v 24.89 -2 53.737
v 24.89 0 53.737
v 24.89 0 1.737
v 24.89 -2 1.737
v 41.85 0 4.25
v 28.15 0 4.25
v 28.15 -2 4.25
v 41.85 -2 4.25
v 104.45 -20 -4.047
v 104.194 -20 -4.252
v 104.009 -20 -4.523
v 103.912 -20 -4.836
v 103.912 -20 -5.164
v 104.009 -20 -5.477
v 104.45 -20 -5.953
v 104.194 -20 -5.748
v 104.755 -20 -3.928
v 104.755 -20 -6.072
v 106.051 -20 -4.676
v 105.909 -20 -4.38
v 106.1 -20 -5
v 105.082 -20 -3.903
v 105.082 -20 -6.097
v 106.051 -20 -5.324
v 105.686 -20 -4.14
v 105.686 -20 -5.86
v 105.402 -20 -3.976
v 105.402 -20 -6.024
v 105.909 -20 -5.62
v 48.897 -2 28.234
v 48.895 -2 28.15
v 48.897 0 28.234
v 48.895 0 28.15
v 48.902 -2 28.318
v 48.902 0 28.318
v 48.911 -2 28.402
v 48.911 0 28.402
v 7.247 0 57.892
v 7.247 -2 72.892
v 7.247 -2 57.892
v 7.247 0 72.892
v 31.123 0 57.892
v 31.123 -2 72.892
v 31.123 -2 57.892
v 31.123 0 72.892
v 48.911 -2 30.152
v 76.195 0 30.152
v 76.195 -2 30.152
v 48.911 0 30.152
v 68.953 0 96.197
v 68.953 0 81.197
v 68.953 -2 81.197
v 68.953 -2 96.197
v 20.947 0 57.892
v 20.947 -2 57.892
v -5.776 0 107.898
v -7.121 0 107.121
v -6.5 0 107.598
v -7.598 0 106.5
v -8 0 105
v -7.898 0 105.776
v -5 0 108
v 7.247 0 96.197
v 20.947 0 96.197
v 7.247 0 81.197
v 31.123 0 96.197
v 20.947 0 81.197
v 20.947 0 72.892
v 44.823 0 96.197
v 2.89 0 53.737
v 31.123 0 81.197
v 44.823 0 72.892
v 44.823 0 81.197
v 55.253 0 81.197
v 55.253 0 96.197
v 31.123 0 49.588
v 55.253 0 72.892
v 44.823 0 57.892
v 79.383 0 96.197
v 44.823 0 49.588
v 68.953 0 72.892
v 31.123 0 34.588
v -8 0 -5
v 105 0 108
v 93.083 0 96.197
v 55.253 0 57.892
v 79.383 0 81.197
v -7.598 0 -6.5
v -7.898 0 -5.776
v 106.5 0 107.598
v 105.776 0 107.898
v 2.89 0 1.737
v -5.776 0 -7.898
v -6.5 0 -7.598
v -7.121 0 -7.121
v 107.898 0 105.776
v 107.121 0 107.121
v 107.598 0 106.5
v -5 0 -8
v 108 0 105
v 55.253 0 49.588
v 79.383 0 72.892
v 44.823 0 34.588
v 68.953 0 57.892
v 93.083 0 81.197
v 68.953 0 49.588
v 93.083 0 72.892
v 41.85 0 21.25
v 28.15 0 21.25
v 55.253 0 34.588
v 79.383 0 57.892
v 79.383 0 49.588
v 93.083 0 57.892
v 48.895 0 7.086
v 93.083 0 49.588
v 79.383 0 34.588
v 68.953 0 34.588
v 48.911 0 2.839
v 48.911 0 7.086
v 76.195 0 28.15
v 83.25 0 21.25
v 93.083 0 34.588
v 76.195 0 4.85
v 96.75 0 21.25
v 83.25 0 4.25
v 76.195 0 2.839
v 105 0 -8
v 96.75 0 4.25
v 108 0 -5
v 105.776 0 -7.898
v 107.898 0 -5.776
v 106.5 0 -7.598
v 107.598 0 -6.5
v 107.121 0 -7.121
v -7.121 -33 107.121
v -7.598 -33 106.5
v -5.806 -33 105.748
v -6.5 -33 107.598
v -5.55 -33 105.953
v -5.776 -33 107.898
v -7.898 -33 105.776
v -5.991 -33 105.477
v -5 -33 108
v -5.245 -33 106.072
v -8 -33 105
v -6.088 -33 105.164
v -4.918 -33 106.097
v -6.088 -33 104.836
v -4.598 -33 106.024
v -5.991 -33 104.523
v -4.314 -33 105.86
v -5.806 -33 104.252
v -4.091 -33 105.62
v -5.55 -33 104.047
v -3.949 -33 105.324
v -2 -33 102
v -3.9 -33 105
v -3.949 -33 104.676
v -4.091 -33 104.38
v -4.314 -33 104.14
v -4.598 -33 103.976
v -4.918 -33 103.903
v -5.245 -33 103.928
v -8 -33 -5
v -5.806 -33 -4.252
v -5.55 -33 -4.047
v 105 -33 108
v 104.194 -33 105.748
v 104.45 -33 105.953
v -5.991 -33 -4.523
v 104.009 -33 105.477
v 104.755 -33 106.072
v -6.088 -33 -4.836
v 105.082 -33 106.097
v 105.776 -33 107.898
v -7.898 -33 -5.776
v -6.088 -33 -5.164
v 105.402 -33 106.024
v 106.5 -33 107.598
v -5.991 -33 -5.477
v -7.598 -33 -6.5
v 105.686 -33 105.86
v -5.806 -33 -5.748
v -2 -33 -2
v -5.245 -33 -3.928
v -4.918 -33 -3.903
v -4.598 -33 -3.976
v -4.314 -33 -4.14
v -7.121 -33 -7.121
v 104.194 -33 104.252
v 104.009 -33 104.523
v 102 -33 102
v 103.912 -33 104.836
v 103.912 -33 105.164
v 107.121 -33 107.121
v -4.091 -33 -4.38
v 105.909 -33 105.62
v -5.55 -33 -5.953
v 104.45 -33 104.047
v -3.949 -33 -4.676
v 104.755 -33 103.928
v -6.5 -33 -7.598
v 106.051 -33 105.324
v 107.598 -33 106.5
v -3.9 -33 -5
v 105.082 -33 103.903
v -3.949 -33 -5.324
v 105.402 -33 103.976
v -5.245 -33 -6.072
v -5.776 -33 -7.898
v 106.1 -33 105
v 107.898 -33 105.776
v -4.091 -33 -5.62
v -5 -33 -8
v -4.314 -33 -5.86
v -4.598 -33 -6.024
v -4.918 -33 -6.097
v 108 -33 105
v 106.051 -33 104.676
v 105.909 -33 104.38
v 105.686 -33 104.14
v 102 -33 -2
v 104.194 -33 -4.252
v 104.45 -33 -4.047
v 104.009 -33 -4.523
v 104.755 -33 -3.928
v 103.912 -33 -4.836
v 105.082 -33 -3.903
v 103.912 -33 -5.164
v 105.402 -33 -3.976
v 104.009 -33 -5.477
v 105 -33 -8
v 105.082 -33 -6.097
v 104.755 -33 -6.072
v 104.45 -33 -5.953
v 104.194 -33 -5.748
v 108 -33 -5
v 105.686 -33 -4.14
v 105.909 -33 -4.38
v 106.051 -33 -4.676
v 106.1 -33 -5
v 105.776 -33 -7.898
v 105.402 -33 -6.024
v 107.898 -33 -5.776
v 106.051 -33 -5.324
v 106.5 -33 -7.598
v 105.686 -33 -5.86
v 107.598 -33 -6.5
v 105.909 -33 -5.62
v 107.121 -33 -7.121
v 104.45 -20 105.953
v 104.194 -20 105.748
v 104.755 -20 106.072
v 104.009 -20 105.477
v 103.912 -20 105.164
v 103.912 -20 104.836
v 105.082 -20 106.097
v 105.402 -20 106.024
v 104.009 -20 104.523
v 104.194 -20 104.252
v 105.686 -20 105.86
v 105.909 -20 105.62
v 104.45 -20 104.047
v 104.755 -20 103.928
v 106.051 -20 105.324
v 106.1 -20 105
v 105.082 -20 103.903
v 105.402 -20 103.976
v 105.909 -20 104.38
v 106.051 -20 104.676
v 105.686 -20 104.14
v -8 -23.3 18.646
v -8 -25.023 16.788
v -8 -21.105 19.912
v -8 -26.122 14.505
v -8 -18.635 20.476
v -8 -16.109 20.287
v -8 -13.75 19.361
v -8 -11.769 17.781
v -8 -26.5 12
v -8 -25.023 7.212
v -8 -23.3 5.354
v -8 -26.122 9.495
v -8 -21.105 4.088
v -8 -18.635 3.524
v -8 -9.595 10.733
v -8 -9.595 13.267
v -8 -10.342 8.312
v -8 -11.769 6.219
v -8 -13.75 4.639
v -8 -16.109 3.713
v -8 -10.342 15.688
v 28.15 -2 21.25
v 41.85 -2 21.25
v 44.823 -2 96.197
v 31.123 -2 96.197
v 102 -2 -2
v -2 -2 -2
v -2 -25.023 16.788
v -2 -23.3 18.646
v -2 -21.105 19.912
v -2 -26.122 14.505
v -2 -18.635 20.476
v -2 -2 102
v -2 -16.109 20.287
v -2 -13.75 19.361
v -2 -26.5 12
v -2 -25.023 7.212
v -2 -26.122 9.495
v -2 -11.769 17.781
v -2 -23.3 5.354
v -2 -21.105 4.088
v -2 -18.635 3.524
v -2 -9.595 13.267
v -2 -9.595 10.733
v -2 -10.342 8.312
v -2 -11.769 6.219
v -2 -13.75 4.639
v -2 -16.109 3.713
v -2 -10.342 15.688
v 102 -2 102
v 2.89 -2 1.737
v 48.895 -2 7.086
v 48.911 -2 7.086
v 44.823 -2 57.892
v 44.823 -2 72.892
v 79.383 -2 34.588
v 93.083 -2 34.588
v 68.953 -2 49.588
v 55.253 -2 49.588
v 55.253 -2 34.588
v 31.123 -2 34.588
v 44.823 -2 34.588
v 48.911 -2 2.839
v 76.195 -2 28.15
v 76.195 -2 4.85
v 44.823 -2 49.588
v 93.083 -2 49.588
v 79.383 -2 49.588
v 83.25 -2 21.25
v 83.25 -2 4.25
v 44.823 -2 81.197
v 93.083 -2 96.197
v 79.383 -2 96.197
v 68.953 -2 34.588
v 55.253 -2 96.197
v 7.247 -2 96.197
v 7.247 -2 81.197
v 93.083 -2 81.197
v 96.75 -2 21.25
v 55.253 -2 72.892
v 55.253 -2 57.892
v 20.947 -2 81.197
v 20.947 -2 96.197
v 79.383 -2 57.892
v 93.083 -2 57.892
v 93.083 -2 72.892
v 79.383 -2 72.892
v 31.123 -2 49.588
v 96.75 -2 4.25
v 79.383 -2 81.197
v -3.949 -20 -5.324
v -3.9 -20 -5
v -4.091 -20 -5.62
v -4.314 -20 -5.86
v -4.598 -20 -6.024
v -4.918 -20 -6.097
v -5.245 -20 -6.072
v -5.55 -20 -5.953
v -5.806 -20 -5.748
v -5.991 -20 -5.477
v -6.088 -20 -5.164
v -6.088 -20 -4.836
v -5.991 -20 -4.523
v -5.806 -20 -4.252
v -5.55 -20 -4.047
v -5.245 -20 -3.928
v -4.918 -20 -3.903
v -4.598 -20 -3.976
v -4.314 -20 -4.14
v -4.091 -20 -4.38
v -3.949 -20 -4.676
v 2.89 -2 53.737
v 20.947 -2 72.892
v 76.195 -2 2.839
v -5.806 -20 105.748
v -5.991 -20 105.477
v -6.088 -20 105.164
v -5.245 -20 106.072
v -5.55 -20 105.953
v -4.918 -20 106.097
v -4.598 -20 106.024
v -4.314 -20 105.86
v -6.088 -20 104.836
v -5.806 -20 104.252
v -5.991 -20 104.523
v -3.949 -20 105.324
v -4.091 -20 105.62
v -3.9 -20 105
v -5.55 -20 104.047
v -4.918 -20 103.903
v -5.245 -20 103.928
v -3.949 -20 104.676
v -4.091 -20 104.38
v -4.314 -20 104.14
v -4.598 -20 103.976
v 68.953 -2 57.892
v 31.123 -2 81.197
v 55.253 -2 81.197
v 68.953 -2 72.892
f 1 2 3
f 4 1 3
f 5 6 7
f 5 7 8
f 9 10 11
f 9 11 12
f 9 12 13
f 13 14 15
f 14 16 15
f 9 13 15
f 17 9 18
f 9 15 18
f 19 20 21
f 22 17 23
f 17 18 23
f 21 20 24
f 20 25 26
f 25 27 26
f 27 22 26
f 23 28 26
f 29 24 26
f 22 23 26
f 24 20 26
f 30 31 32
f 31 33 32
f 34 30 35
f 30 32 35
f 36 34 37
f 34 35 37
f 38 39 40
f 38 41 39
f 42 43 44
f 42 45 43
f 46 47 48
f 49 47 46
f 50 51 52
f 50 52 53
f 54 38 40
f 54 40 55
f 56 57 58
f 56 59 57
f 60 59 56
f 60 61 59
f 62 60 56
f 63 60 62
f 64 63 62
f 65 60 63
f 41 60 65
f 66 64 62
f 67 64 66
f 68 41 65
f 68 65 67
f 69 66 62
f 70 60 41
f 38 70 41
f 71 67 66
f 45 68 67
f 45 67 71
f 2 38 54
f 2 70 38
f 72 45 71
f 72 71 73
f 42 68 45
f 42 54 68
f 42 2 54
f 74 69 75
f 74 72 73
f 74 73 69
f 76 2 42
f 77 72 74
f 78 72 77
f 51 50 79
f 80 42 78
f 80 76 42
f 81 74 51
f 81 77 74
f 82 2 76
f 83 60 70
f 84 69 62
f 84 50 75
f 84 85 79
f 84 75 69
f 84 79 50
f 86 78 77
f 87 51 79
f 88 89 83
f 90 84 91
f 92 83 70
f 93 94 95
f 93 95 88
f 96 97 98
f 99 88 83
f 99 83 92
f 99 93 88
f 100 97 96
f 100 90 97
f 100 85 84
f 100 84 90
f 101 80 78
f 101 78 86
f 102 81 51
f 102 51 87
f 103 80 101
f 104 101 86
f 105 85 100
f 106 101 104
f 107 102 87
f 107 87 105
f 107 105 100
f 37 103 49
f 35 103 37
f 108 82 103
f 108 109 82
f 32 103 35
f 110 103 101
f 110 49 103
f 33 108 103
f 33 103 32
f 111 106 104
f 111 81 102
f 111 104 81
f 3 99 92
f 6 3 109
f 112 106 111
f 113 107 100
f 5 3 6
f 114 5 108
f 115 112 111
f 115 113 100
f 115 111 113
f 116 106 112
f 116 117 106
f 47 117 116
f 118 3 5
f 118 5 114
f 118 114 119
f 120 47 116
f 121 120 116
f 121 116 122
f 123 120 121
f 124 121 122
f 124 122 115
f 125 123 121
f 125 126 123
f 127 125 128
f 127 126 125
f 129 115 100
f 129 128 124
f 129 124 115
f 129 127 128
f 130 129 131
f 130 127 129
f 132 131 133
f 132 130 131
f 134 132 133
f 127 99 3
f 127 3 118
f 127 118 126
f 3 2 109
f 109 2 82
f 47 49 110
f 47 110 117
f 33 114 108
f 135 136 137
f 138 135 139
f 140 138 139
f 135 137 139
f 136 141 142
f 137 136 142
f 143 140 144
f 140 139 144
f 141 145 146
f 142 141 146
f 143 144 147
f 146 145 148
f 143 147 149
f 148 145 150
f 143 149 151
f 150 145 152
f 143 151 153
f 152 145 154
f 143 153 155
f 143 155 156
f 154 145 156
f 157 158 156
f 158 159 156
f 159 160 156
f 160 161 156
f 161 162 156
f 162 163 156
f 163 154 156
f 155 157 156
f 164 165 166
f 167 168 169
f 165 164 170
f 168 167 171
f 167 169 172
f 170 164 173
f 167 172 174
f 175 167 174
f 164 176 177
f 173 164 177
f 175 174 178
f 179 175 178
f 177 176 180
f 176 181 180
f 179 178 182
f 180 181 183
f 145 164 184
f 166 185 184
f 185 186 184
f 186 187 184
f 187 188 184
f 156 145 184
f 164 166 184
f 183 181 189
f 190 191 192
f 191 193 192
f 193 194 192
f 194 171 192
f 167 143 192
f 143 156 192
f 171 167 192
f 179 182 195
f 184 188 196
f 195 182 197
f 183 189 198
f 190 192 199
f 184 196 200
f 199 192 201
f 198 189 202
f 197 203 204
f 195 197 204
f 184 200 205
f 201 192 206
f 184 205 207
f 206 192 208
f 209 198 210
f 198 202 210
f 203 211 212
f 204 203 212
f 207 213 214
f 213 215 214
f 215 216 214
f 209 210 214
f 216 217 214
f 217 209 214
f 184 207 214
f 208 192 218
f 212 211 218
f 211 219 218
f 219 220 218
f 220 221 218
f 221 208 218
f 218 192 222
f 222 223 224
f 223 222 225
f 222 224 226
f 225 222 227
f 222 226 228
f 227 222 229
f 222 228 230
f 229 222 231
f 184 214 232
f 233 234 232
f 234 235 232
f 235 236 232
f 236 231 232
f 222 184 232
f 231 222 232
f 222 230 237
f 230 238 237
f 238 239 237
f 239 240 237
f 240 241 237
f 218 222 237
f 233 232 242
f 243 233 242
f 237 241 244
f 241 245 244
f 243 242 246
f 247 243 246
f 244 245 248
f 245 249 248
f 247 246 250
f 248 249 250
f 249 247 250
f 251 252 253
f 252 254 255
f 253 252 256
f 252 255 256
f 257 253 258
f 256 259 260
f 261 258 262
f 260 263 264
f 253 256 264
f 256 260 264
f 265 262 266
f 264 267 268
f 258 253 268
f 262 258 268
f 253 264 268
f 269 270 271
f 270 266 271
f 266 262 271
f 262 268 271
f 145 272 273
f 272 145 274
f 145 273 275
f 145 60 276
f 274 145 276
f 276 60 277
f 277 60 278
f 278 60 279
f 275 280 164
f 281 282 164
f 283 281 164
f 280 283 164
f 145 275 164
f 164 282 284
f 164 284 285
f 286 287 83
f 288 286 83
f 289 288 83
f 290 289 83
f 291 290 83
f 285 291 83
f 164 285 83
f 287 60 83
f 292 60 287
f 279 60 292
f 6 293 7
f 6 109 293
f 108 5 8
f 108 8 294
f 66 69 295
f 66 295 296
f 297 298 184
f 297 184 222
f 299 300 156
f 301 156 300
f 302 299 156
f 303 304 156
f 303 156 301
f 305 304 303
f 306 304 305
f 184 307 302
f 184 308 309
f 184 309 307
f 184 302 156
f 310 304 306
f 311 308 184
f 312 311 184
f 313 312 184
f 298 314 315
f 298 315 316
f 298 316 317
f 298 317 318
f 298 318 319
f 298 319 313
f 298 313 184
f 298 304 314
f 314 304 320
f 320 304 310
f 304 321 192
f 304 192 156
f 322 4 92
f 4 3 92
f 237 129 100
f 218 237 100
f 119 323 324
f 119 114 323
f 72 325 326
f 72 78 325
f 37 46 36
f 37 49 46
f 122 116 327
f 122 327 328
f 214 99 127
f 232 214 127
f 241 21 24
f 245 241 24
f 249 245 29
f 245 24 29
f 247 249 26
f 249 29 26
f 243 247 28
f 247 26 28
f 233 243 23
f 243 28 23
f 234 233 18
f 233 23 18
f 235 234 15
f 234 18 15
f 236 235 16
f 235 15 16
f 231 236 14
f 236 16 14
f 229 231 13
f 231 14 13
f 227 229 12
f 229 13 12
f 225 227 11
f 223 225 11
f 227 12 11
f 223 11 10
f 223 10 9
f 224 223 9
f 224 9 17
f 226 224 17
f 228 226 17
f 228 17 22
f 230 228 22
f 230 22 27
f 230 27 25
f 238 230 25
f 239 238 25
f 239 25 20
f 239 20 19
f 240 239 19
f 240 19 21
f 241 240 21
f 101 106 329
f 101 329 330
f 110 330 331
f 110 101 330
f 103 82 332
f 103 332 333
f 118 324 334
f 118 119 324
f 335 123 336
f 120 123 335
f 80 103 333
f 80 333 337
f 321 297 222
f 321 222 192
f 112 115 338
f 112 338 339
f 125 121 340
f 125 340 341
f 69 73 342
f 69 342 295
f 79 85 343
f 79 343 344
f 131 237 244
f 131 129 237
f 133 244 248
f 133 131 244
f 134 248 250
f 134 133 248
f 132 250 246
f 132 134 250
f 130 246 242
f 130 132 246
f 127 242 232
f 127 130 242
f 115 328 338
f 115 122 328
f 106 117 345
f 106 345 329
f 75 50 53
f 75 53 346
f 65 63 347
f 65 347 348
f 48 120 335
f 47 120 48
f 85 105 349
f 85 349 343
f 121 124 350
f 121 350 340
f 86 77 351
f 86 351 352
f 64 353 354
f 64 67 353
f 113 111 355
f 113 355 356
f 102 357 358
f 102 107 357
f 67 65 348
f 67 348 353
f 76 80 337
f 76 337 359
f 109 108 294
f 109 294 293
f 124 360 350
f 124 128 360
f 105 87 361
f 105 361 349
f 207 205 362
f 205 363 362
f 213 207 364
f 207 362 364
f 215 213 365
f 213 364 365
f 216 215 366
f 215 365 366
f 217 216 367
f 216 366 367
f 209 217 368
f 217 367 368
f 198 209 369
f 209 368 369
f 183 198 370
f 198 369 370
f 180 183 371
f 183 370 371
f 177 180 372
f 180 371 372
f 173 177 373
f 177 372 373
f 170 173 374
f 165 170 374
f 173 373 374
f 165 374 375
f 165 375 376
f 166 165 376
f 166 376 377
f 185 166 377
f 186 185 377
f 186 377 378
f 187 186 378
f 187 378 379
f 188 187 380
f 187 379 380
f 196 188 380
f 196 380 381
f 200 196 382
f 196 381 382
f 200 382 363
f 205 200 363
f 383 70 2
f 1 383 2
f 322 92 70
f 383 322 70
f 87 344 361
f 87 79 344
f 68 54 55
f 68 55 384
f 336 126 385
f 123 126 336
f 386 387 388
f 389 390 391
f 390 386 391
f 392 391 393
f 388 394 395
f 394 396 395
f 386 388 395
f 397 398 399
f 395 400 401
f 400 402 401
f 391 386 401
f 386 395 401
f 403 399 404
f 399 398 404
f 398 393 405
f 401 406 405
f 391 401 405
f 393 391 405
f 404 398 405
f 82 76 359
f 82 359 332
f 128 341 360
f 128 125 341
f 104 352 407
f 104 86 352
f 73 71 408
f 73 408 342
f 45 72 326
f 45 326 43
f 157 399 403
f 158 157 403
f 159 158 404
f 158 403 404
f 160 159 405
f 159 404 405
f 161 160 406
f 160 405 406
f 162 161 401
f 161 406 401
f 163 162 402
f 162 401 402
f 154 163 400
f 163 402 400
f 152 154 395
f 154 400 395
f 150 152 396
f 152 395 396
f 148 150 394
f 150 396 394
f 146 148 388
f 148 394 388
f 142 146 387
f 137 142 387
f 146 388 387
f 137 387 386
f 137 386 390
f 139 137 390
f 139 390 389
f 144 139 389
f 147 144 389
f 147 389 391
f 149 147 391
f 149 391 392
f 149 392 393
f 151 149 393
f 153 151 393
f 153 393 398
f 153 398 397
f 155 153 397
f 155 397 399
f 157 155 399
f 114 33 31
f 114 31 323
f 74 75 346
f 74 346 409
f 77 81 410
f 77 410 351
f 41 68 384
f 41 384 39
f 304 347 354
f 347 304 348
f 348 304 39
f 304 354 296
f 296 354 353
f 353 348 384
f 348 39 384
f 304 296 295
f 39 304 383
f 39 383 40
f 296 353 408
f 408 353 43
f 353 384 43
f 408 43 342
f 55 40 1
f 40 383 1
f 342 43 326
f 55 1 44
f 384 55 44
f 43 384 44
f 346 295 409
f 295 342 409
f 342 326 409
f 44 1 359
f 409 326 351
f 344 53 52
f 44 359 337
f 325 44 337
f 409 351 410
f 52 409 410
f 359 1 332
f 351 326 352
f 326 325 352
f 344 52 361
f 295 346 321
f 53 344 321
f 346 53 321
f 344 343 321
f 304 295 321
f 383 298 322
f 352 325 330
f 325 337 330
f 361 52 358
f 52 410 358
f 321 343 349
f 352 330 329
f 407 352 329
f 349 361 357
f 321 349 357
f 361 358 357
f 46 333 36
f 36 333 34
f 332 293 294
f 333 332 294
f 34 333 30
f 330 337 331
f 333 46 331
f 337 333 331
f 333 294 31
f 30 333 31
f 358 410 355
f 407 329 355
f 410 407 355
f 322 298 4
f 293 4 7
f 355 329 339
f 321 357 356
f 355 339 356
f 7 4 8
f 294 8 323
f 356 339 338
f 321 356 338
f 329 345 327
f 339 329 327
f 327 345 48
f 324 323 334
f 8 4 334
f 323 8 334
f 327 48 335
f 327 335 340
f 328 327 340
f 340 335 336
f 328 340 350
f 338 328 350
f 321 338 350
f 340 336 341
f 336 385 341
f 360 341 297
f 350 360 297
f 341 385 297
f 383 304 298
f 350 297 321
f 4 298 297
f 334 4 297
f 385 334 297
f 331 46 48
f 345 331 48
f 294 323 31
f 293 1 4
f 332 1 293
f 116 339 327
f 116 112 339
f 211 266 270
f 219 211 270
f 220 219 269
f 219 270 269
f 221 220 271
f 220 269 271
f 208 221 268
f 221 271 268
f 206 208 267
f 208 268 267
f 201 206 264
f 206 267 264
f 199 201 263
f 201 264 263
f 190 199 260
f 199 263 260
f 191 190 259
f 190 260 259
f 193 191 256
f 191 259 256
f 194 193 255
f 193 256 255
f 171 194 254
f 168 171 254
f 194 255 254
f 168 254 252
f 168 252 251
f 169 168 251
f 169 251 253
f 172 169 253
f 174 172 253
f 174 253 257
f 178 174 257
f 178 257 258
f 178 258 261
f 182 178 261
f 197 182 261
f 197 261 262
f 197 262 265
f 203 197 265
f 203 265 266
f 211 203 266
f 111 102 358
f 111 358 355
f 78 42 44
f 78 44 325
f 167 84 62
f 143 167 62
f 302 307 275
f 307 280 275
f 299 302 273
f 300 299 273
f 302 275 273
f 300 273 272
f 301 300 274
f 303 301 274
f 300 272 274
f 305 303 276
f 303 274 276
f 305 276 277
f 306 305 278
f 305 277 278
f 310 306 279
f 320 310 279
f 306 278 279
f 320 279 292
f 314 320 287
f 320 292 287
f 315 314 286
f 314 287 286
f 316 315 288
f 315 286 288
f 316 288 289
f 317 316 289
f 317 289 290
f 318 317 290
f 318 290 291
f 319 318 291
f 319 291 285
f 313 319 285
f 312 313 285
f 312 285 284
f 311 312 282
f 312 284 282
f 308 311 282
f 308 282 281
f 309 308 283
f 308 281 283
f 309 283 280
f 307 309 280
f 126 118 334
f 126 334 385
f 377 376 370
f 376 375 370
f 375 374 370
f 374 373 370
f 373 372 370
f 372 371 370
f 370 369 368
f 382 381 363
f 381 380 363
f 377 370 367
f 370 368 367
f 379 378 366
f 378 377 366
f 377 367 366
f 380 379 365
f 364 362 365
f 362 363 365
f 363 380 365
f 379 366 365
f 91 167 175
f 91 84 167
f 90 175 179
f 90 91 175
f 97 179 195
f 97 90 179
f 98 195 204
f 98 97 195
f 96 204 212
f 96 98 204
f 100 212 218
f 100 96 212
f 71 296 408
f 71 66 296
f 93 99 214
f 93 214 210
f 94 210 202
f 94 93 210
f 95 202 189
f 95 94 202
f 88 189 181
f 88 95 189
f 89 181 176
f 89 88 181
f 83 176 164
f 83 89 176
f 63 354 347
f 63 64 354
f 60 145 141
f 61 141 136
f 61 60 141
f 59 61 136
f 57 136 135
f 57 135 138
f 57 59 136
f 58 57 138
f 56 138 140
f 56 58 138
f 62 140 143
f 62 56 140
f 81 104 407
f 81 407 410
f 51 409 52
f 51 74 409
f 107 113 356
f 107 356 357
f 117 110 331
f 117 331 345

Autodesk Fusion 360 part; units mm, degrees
sketch "MacroKeyboard" plane through (0, 0, 0) normal (0, 1, 0) x (1, 0, 0)
  line L0 (24.38, -2.5067) -> (24.3899, -2.2367)
  line L1 (48.8951, -28.1499) -> (48.8951, -6.1499)
  line L2 (48.8951, -6.1499) -> (48.8951, -4.8499)
  line L3 (50.8951, -2.8499) -> (74.1951, -2.8499)
  line L4 (76.1951, -4.8499) -> (76.1951, -28.1499)
  line L5 (48.8951, -26.0859) -> (75.8951, -26.0859)
  line L6 (75.8951, -26.0859) -> (76.1951, -26.0859)
  line L7 (48.8951, -7.0859) -> (76.1951, -7.0859)
  line L8 (50.9271, -30.1499) -> (53.9271, -30.1499)
  line L9 (71.2271, -30.1499) -> (74.2271, -30.1499)
  line L10 (55.9271, -28.1499) -> (69.2271, -28.1499)
  line L11 (53.9271, -30.1499) -> (55.9271, -28.1499)
  line L12 (69.2271, -28.1499) -> (71.2271, -30.1499)
  line L13 (36.27, -14.02) -> (33.73, -14.02)
  line L14 (28.7501, -19.4501) -> (28.7501, -14.9001)
  line L15 (41.2502, -19.4501) -> (41.2502, -14.9001)
  line L16 (28.7501, -10.6) -> (28.7501, -6.05)
  line L17 (41.2502, -10.6) -> (41.2502, -6.05)
  line L18 (38.7003, -6.05) -> (41.2504, -6.05)
  line L19 (38.4002, -19.4501) -> (41.2501, -19.4501)
  line L20 (35.92, -19.4501) -> (36.62, -19.4501)
  line L21 (33.4, -19.4501) -> (34.1, -19.4501)
  line L22 (28.7501, -19.4501) -> (31.6, -19.4501)
  line L23 (33.725, -6.05) -> (36.275, -6.05)
  line L24 (28.7501, -6.05) -> (31.3, -6.05)
  line L25 (91.27, -14.02) -> (88.73, -14.02)
  line L26 (83.7501, -19.4501) -> (83.7501, -14.9001)
  line L27 (96.2502, -19.4501) -> (96.2502, -14.9001)
  line L28 (83.7501, -10.6) -> (83.7501, -6.05)
  line L29 (96.2502, -10.6) -> (96.2502, -6.05)
  line L30 (93.7003, -6.05) -> (96.2504, -6.05)
  line L31 (93.4002, -19.4501) -> (96.2501, -19.4501)
  line L32 (90.92, -19.4501) -> (91.62, -19.4501)
  line L33 (88.4, -19.4501) -> (89.1, -19.4501)
  line L34 (83.7501, -19.4501) -> (86.6, -19.4501)
  line L35 (88.725, -6.05) -> (91.275, -6.05)
  line L36 (83.7501, -6.05) -> (86.3, -6.05)
  arc A0 (48.8951, -28.1499) -> (50.8951, -30.1499) centre (50.8951, -28.1499) ccw
  arc A1 (50.8915, -2.8524) -> (48.8926, -4.8514) centre (50.8915, -4.8514) ccw
  arc A2 (76.2103, -4.8412) -> (74.2113, -2.8423) centre (74.2113, -4.8412) ccw
  arc A3 (74.1961, -30.1524) -> (76.1951, -28.1534) centre (74.1961, -28.1534) ccw
  arc A4 (36.27, -14.02) -> (33.73, -14.02) centre (35, -12.75) ccw
  arc A5 (91.27, -14.02) -> (88.73, -14.02) centre (90, -12.75) ccw
  circle A6 centre (35, -12.7501) radius 3
  circle A7 centre (90, -12.7501) radius 3
  circle A8 centre (34.1631, -39.5479) radius 0.7493
  circle A9 centre (34.1631, -39.5479) radius 1.1557
  circle A10 centre (40.5131, -37.0079) radius 0.7493
  circle A11 centre (40.5131, -37.0079) radius 1.1557
  circle A12 centre (58.2931, -39.5479) radius 0.7493
  circle A13 centre (58.2931, -39.5479) radius 1.1557
  circle A14 centre (64.6431, -37.0079) radius 0.7493
  circle A15 centre (64.6431, -37.0079) radius 1.1557
  circle A16 centre (82.4232, -39.5479) radius 0.7493
  circle A17 centre (82.4232, -39.5479) radius 1.1557
  circle A18 centre (88.7732, -37.0079) radius 0.7493
  circle A19 centre (88.7732, -37.0079) radius 1.1557
  circle A20 centre (10.287, -62.8524) radius 0.7493
  circle A21 centre (10.287, -62.8524) radius 1.1557
  circle A22 centre (16.637, -60.3124) radius 0.7493
  circle A23 centre (16.637, -60.3124) radius 1.1557
  circle A24 centre (34.163, -62.8524) radius 0.7493
  circle A25 centre (34.1631, -62.8524) radius 1.1557
  circle A26 centre (40.513, -60.3124) radius 0.7493
  circle A27 centre (40.5131, -60.3124) radius 1.1557
  circle A28 centre (58.2932, -62.8524) radius 0.7493
  circle A29 centre (58.2931, -62.8524) radius 1.1557
  circle A30 centre (64.6432, -60.3124) radius 0.7493
  circle A31 centre (64.6431, -60.3124) radius 1.1557
  circle A32 centre (82.4232, -62.8524) radius 0.7493
  circle A33 centre (82.4232, -62.8524) radius 1.1557
  circle A34 centre (88.7732, -60.3124) radius 0.7493
  circle A35 centre (88.7732, -60.3124) radius 1.1557
  circle A36 centre (10.287, -86.157) radius 0.7493
  circle A37 centre (10.287, -86.157) radius 1.1557
  circle A38 centre (16.637, -83.617) radius 0.7493
  circle A39 centre (16.637, -83.617) radius 1.1557
  circle A40 centre (34.1631, -86.157) radius 0.7493
  circle A41 centre (34.1631, -86.157) radius 1.1557
  circle A42 centre (40.5131, -83.617) radius 0.7493
  circle A43 centre (40.5131, -83.617) radius 1.1557
  circle A44 centre (58.2931, -86.157) radius 0.7493
  circle A45 centre (58.2931, -86.157) radius 1.1557
  circle A46 centre (64.6431, -83.617) radius 0.7493
  circle A47 centre (64.6431, -83.617) radius 1.1557
  circle A48 centre (82.4232, -86.157) radius 0.7493
  circle A49 centre (82.4232, -86.157) radius 1.1557
  circle A50 centre (88.7732, -83.617) radius 0.7493
  circle A51 centre (88.7732, -83.617) radius 1.1557
  arc A52 (5.0001, -4.1567) -> (5.0001, -3.0569) centre (5.0001, -3.6068) ccw
  arc A53 (4.9999, -3.0569) -> (4.9999, -4.1567) centre (4.9999, -3.6068) ccw
  line L37 (5.0001, -4.1567) -> (4.9999, -4.1567)
  line L38 (4.9999, -4.1567) -> (5.0001, -4.1567)
  line L39 (5.0001, -3.0569) -> (4.9999, -3.0569)
  line L40 (4.9999, -3.0569) -> (5.0001, -3.0569)
  arc A54 (5.0001, -6.6967) -> (5.0001, -5.5969) centre (5.0001, -6.1468) ccw
  arc A55 (4.9999, -5.5969) -> (4.9999, -6.6967) centre (4.9999, -6.1468) ccw
  line L41 (4.9999, -6.6967) -> (5.0001, -6.6967)
  line L42 (5.0001, -6.6967) -> (4.9999, -6.6967)
  line L43 (5.0001, -5.5969) -> (4.9999, -5.5969)
  line L44 (4.9999, -5.5969) -> (5.0001, -5.5969)
  arc A56 (5.0001, -9.2367) -> (5.0001, -8.1369) centre (5.0001, -8.6868) ccw
  arc A57 (4.9999, -8.1369) -> (4.9999, -9.2367) centre (4.9999, -8.6868) ccw
  line L45 (5.0001, -9.2367) -> (4.9999, -9.2367)
  line L46 (4.9999, -9.2367) -> (5.0001, -9.2367)
  line L47 (4.9999, -8.1369) -> (5.0001, -8.1369)
  line L48 (5.0001, -8.1369) -> (4.9999, -8.1369)
  arc A58 (5.0001, -11.7767) -> (5.0001, -10.6769) centre (5.0001, -11.2268) ccw
  arc A59 (4.9999, -10.6769) -> (4.9999, -11.7767) centre (4.9999, -11.2268) ccw
  line L49 (5.0001, -11.7767) -> (4.9999, -11.7767)
  line L50 (4.9999, -11.7767) -> (5.0001, -11.7767)
  line L51 (4.9999, -10.6769) -> (5.0001, -10.6769)
  line L52 (5.0001, -10.6769) -> (4.9999, -10.6769)
  arc A60 (5.0001, -14.3167) -> (5.0001, -13.2169) centre (5.0001, -13.7668) ccw
  arc A61 (4.9999, -13.2169) -> (4.9999, -14.3167) centre (4.9999, -13.7668) ccw
  line L53 (5.0001, -14.3167) -> (4.9999, -14.3167)
  line L54 (4.9999, -14.3167) -> (5.0001, -14.3167)
  line L55 (5.0001, -13.2169) -> (4.9999, -13.2169)
  line L56 (4.9999, -13.2169) -> (5.0001, -13.2169)
  arc A62 (5.0001, -16.8567) -> (5.0001, -15.7569) centre (5.0001, -16.3068) ccw
  arc A63 (4.9999, -15.7569) -> (4.9999, -16.8567) centre (4.9999, -16.3068) ccw
  line L57 (4.9999, -16.8567) -> (5.0001, -16.8567)
  line L58 (5.0001, -16.8567) -> (4.9999, -16.8567)
  line L59 (5.0001, -15.7569) -> (4.9999, -15.7569)
  line L60 (4.9999, -15.7569) -> (5.0001, -15.7569)
  arc A64 (5.0001, -19.3967) -> (5.0001, -18.2969) centre (5.0001, -18.8468) ccw
  arc A65 (4.9999, -18.2969) -> (4.9999, -19.3967) centre (4.9999, -18.8468) ccw
  line L61 (5.0001, -19.3967) -> (4.9999, -19.3967)
  line L62 (4.9999, -19.3967) -> (5.0001, -19.3967)
  line L63 (5.0001, -18.2969) -> (4.9999, -18.2969)
  line L64 (4.9999, -18.2969) -> (5.0001, -18.2969)
  arc A66 (5.0001, -21.9368) -> (5.0001, -20.8369) centre (5.0001, -21.3868) ccw
  arc A67 (4.9999, -20.8369) -> (4.9999, -21.9368) centre (4.9999, -21.3868) ccw
  line L65 (5.0001, -21.9368) -> (4.9999, -21.9368)
  line L66 (4.9999, -21.9368) -> (5.0001, -21.9368)
  line L67 (5.0001, -20.8369) -> (4.9999, -20.8369)
  line L68 (4.9999, -20.8369) -> (5.0001, -20.8369)
  arc A68 (5.0001, -24.4768) -> (5.0001, -23.3769) centre (5.0001, -23.9268) ccw
  arc A69 (4.9999, -23.3769) -> (4.9999, -24.4768) centre (4.9999, -23.9268) ccw
  line L69 (5.0001, -24.4768) -> (4.9999, -24.4768)
  line L70 (4.9999, -24.4768) -> (5.0001, -24.4768)
  line L71 (5.0001, -23.3769) -> (4.9999, -23.3769)
  line L72 (4.9999, -23.3769) -> (5.0001, -23.3769)
  arc A70 (5.0001, -27.0168) -> (5.0001, -25.9169) centre (5.0001, -26.4669) ccw
  arc A71 (4.9999, -25.9169) -> (4.9999, -27.0168) centre (4.9999, -26.4669) ccw
  line L73 (4.9999, -27.0168) -> (5.0001, -27.0168)
  line L74 (5.0001, -27.0168) -> (4.9999, -27.0168)
  line L75 (4.9999, -25.9169) -> (5.0001, -25.9169)
  line L76 (5.0001, -25.9169) -> (4.9999, -25.9169)
  arc A72 (5.0001, -29.5568) -> (5.0001, -28.4569) centre (5.0001, -29.0069) ccw
  arc A73 (4.9999, -28.4569) -> (4.9999, -29.5568) centre (4.9999, -29.0069) ccw
  line L77 (5.0001, -29.5568) -> (4.9999, -29.5568)
  line L78 (4.9999, -29.5568) -> (5.0001, -29.5568)
  line L79 (4.9999, -28.4569) -> (5.0001, -28.4569)
  line L80 (5.0001, -28.4569) -> (4.9999, -28.4569)
  arc A74 (5.0001, -32.0968) -> (5.0001, -30.997) centre (5.0001, -31.5469) ccw
  arc A75 (4.9999, -30.997) -> (4.9999, -32.0968) centre (4.9999, -31.5469) ccw
  line L81 (4.9999, -32.0968) -> (5.0001, -32.0968)
  line L82 (5.0001, -32.0968) -> (4.9999, -32.0968)
  line L83 (4.9999, -30.997) -> (5.0001, -30.997)
  line L84 (5.0001, -30.997) -> (4.9999, -30.997)
  arc A76 (5.0001, -34.6368) -> (5.0001, -33.537) centre (5.0001, -34.0869) ccw
  arc A77 (4.9999, -33.537) -> (4.9999, -34.6368) centre (4.9999, -34.0869) ccw
  line L85 (5.0001, -34.6368) -> (4.9999, -34.6368)
  line L86 (4.9999, -34.6368) -> (5.0001, -34.6368)
  line L87 (5.0001, -33.537) -> (4.9999, -33.537)
  line L88 (4.9999, -33.537) -> (5.0001, -33.537)
  arc A78 (5.0001, -37.1768) -> (5.0001, -36.077) centre (5.0001, -36.6269) ccw
  arc A79 (4.9999, -36.077) -> (4.9999, -37.1768) centre (4.9999, -36.6269) ccw
  line L89 (5.0001, -37.1768) -> (4.9999, -37.1768)
  line L90 (4.9999, -37.1768) -> (5.0001, -37.1768)
  line L91 (5.0001, -36.077) -> (4.9999, -36.077)
  line L92 (4.9999, -36.077) -> (5.0001, -36.077)
  arc A80 (5.0001, -39.7168) -> (5.0001, -38.617) centre (5.0001, -39.1669) ccw
  arc A81 (4.9999, -38.617) -> (4.9999, -39.7168) centre (4.9999, -39.1669) ccw
  line L93 (4.9999, -39.7168) -> (5.0001, -39.7168)
  line L94 (5.0001, -39.7168) -> (4.9999, -39.7168)
  line L95 (5.0001, -38.617) -> (4.9999, -38.617)
  line L96 (4.9999, -38.617) -> (5.0001, -38.617)
  arc A82 (5.0001, -42.2568) -> (5.0001, -41.157) centre (5.0001, -41.7069) ccw
  arc A83 (4.9999, -41.157) -> (4.9999, -42.2568) centre (4.9999, -41.7069) ccw
  line L97 (4.9999, -42.2568) -> (5.0001, -42.2568)
  line L98 (5.0001, -42.2568) -> (4.9999, -42.2568)
  line L99 (4.9999, -41.157) -> (5.0001, -41.157)
  line L100 (5.0001, -41.157) -> (4.9999, -41.157)
  arc A84 (5.0001, -44.7968) -> (5.0001, -43.697) centre (5.0001, -44.2469) ccw
  arc A85 (4.9999, -43.697) -> (4.9999, -44.7968) centre (4.9999, -44.2469) ccw
  line L101 (4.9999, -44.7968) -> (5.0001, -44.7968)
  line L102 (5.0001, -44.7968) -> (4.9999, -44.7968)
  line L103 (4.9999, -43.697) -> (5.0001, -43.697)
  line L104 (5.0001, -43.697) -> (4.9999, -43.697)
  arc A86 (5.0001, -47.3368) -> (5.0001, -46.237) centre (5.0001, -46.7869) ccw
  arc A87 (4.9999, -46.237) -> (4.9999, -47.3368) centre (4.9999, -46.7869) ccw
  line L105 (5.0001, -47.3368) -> (4.9999, -47.3368)
  line L106 (4.9999, -47.3368) -> (5.0001, -47.3368)
  line L107 (4.9999, -46.237) -> (5.0001, -46.237)
  line L108 (5.0001, -46.237) -> (4.9999, -46.237)
  arc A88 (5.0001, -49.8768) -> (5.0001, -48.777) centre (5.0001, -49.3269) ccw
  arc A89 (4.9999, -48.777) -> (4.9999, -49.8768) centre (4.9999, -49.3269) ccw
  line L109 (4.9999, -49.8768) -> (5.0001, -49.8768)
  line L110 (5.0001, -49.8768) -> (4.9999, -49.8768)
  line L111 (5.0001, -48.777) -> (4.9999, -48.777)
  line L112 (4.9999, -48.777) -> (5.0001, -48.777)
  arc A90 (5.0001, -52.4168) -> (5.0001, -51.317) centre (5.0001, -51.8669) ccw
  arc A91 (4.9999, -51.317) -> (4.9999, -52.4168) centre (4.9999, -51.8669) ccw
  line L113 (4.9999, -52.4168) -> (5.0001, -52.4168)
  line L114 (5.0001, -52.4168) -> (4.9999, -52.4168)
  line L115 (4.9999, -51.317) -> (5.0001, -51.317)
  line L116 (5.0001, -51.317) -> (4.9999, -51.317)
  arc A92 (22.7799, -51.317) -> (22.7799, -52.4168) centre (22.7799, -51.8669) ccw
  arc A93 (22.7802, -52.4168) -> (22.7802, -51.317) centre (22.7802, -51.8669) ccw
  line L117 (22.7799, -51.317) -> (22.7802, -51.317)
  line L118 (22.7802, -51.317) -> (22.7799, -51.317)
  line L119 (22.7799, -52.4168) -> (22.7802, -52.4168)
  line L120 (22.7802, -52.4168) -> (22.7799, -52.4168)
  arc A94 (22.7799, -48.777) -> (22.7799, -49.8768) centre (22.7799, -49.3269) ccw
  arc A95 (22.7802, -49.8768) -> (22.7802, -48.777) centre (22.7802, -49.3269) ccw
  line L121 (22.7799, -48.777) -> (22.7802, -48.777)
  line L122 (22.7802, -48.777) -> (22.7799, -48.777)
  line L123 (22.7799, -49.8768) -> (22.7802, -49.8768)
  line L124 (22.7802, -49.8768) -> (22.7799, -49.8768)
  arc A96 (22.7799, -46.237) -> (22.7799, -47.3368) centre (22.7799, -46.7869) ccw
  arc A97 (22.7802, -47.3368) -> (22.7802, -46.237) centre (22.7802, -46.7869) ccw
  line L125 (22.7802, -46.237) -> (22.7799, -46.237)
  line L126 (22.7799, -46.237) -> (22.7802, -46.237)
  line L127 (22.7802, -47.3368) -> (22.7799, -47.3368)
  line L128 (22.7799, -47.3368) -> (22.7802, -47.3368)
  arc A98 (22.7799, -43.697) -> (22.7799, -44.7968) centre (22.7799, -44.2469) ccw
  arc A99 (22.7802, -44.7968) -> (22.7802, -43.697) centre (22.7802, -44.2469) ccw
  line L129 (22.7802, -43.697) -> (22.7799, -43.697)
  line L130 (22.7799, -43.697) -> (22.7802, -43.697)
  line L131 (22.7799, -44.7968) -> (22.7802, -44.7968)
  line L132 (22.7802, -44.7968) -> (22.7799, -44.7968)
  arc A100 (22.7799, -41.157) -> (22.7799, -42.2568) centre (22.7799, -41.7069) ccw
  arc A101 (22.7802, -42.2568) -> (22.7802, -41.157) centre (22.7802, -41.7069) ccw
  line L133 (22.7799, -41.157) -> (22.7802, -41.157)
  line L134 (22.7802, -41.157) -> (22.7799, -41.157)
  line L135 (22.7802, -42.2568) -> (22.7799, -42.2568)
  line L136 (22.7799, -42.2568) -> (22.7802, -42.2568)
  arc A102 (22.7799, -38.617) -> (22.7799, -39.7168) centre (22.7799, -39.1669) ccw
  arc A103 (22.7802, -39.7168) -> (22.7802, -38.617) centre (22.7802, -39.1669) ccw
  line L137 (22.7799, -38.617) -> (22.7802, -38.617)
  line L138 (22.7802, -38.617) -> (22.7799, -38.617)
  line L139 (22.7802, -39.7168) -> (22.7799, -39.7168)
  line L140 (22.7799, -39.7168) -> (22.7802, -39.7168)
  arc A104 (22.7799, -36.077) -> (22.7799, -37.1768) centre (22.7799, -36.6269) ccw
  arc A105 (22.7802, -37.1768) -> (22.7802, -36.077) centre (22.7802, -36.6269) ccw
  line L141 (22.7802, -36.077) -> (22.7799, -36.077)
  line L142 (22.7799, -36.077) -> (22.7802, -36.077)
  line L143 (22.7802, -37.1768) -> (22.7799, -37.1768)
  line L144 (22.7799, -37.1768) -> (22.7802, -37.1768)
  arc A106 (22.7799, -33.537) -> (22.7799, -34.6368) centre (22.7799, -34.0869) ccw
  arc A107 (22.7802, -34.6368) -> (22.7802, -33.537) centre (22.7802, -34.0869) ccw
  line L145 (22.7799, -33.537) -> (22.7802, -33.537)
  line L146 (22.7802, -33.537) -> (22.7799, -33.537)
  line L147 (22.7802, -34.6368) -> (22.7799, -34.6368)
  line L148 (22.7799, -34.6368) -> (22.7802, -34.6368)
  arc A108 (22.7799, -30.997) -> (22.7799, -32.0968) centre (22.7799, -31.5469) ccw
  arc A109 (22.7802, -32.0968) -> (22.7802, -30.997) centre (22.7802, -31.5469) ccw
  line L149 (22.7802, -30.997) -> (22.7799, -30.997)
  line L150 (22.7799, -30.997) -> (22.7802, -30.997)
  line L151 (22.7802, -32.0968) -> (22.7799, -32.0968)
  line L152 (22.7799, -32.0968) -> (22.7802, -32.0968)
  arc A110 (22.7799, -28.4569) -> (22.7799, -29.5568) centre (22.7799, -29.0069) ccw
  arc A111 (22.7802, -29.5568) -> (22.7802, -28.4569) centre (22.7802, -29.0069) ccw
  line L153 (22.7802, -28.4569) -> (22.7799, -28.4569)
  line L154 (22.7799, -28.4569) -> (22.7802, -28.4569)
  line L155 (22.7799, -29.5568) -> (22.7802, -29.5568)
  line L156 (22.7802, -29.5568) -> (22.7799, -29.5568)
  arc A112 (22.7799, -25.9169) -> (22.7799, -27.0168) centre (22.7799, -26.4669) ccw
  arc A113 (22.7802, -27.0168) -> (22.7802, -25.9169) centre (22.7802, -26.4669) ccw
  line L157 (22.7802, -25.9169) -> (22.7799, -25.9169)
  line L158 (22.7799, -25.9169) -> (22.7802, -25.9169)
  line L159 (22.7799, -27.0168) -> (22.7802, -27.0168)
  line L160 (22.7802, -27.0168) -> (22.7799, -27.0168)
  arc A114 (22.7799, -23.3769) -> (22.7799, -24.4768) centre (22.7799, -23.9268) ccw
  arc A115 (22.7802, -24.4768) -> (22.7802, -23.3769) centre (22.7802, -23.9268) ccw
  line L161 (22.7799, -23.3769) -> (22.7802, -23.3769)
  line L162 (22.7802, -23.3769) -> (22.7799, -23.3769)
  line L163 (22.7799, -24.4768) -> (22.7802, -24.4768)
  line L164 (22.7802, -24.4768) -> (22.7799, -24.4768)
  arc A116 (22.7799, -20.8369) -> (22.7799, -21.9368) centre (22.7799, -21.3868) ccw
  arc A117 (22.7802, -21.9368) -> (22.7802, -20.8369) centre (22.7802, -21.3868) ccw
  line L165 (22.7802, -20.8369) -> (22.7799, -20.8369)
  line L166 (22.7799, -20.8369) -> (22.7802, -20.8369)
  line L167 (22.7799, -21.9368) -> (22.7802, -21.9368)
  line L168 (22.7802, -21.9368) -> (22.7799, -21.9368)
  arc A118 (22.7799, -18.2969) -> (22.7799, -19.3967) centre (22.7799, -18.8468) ccw
  arc A119 (22.7802, -19.3967) -> (22.7802, -18.2969) centre (22.7802, -18.8468) ccw
  line L169 (22.7799, -18.2969) -> (22.7802, -18.2969)
  line L170 (22.7802, -18.2969) -> (22.7799, -18.2969)
  line L171 (22.7802, -19.3967) -> (22.7799, -19.3967)
  line L172 (22.7799, -19.3967) -> (22.7802, -19.3967)
  arc A120 (22.7799, -15.7569) -> (22.7799, -16.8567) centre (22.7799, -16.3068) ccw
  arc A121 (22.7802, -16.8567) -> (22.7802, -15.7569) centre (22.7802, -16.3068) ccw
  line L173 (22.7799, -15.7569) -> (22.7802, -15.7569)
  line L174 (22.7802, -15.7569) -> (22.7799, -15.7569)
  line L175 (22.7802, -16.8567) -> (22.7799, -16.8567)
  line L176 (22.7799, -16.8567) -> (22.7802, -16.8567)
  arc A122 (22.7799, -13.2169) -> (22.7799, -14.3167) centre (22.7799, -13.7668) ccw
  arc A123 (22.7802, -14.3167) -> (22.7802, -13.2169) centre (22.7802, -13.7668) ccw
  line L177 (22.7802, -13.2169) -> (22.7799, -13.2169)
  line L178 (22.7799, -13.2169) -> (22.7802, -13.2169)
  line L179 (22.7802, -14.3167) -> (22.7799, -14.3167)
  line L180 (22.7799, -14.3167) -> (22.7802, -14.3167)
  arc A124 (22.7799, -10.6769) -> (22.7799, -11.7767) centre (22.7799, -11.2268) ccw
  arc A125 (22.7802, -11.7767) -> (22.7802, -10.6769) centre (22.7802, -11.2268) ccw
  line L181 (22.7802, -10.6769) -> (22.7799, -10.6769)
  line L182 (22.7799, -10.6769) -> (22.7802, -10.6769)
  line L183 (22.7799, -11.7767) -> (22.7802, -11.7767)
  line L184 (22.7802, -11.7767) -> (22.7799, -11.7767)
  arc A126 (22.7799, -8.1369) -> (22.7799, -9.2367) centre (22.7799, -8.6868) ccw
  arc A127 (22.7802, -9.2367) -> (22.7802, -8.1369) centre (22.7802, -8.6868) ccw
  line L185 (22.7799, -8.1369) -> (22.7802, -8.1369)
  line L186 (22.7802, -8.1369) -> (22.7799, -8.1369)
  line L187 (22.7799, -9.2367) -> (22.7802, -9.2367)
  line L188 (22.7802, -9.2367) -> (22.7799, -9.2367)
  arc A128 (22.7799, -5.5969) -> (22.7799, -6.6967) centre (22.7799, -6.1468) ccw
  arc A129 (22.7802, -6.6967) -> (22.7802, -5.5969) centre (22.7802, -6.1468) ccw
  line L189 (22.7799, -5.5969) -> (22.7802, -5.5969)
  line L190 (22.7802, -5.5969) -> (22.7799, -5.5969)
  line L191 (22.7802, -6.6967) -> (22.7799, -6.6967)
  line L192 (22.7799, -6.6967) -> (22.7802, -6.6967)
  arc A130 (22.7799, -3.0569) -> (22.7799, -4.1567) centre (22.7799, -3.6068) ccw
  arc A131 (22.7802, -4.1567) -> (22.7802, -3.0569) centre (22.7802, -3.6068) ccw
  line L193 (22.7802, -3.0569) -> (22.7799, -3.0569)
  line L194 (22.7799, -3.0569) -> (22.7802, -3.0569)
  line L195 (22.7802, -4.1567) -> (22.7799, -4.1567)
  line L196 (22.7799, -4.1567) -> (22.7802, -4.1567)
  arc A132 (11.8999, -51.6367) -> (10.8001, -51.6367) centre (11.35, -51.6367) ccw
  arc A133 (10.8001, -51.6369) -> (11.8999, -51.6369) centre (11.35, -51.6369) ccw
  line L197 (10.8001, -51.6369) -> (10.8001, -51.6367)
  line L198 (10.8001, -51.6367) -> (10.8001, -51.6369)
  line L199 (11.8999, -51.6367) -> (11.8999, -51.6369)
  line L200 (11.8999, -51.6369) -> (11.8999, -51.6367)
  arc A134 (14.4399, -51.6367) -> (13.3401, -51.6367) centre (13.89, -51.6367) ccw
  arc A135 (13.3401, -51.6369) -> (14.4399, -51.6369) centre (13.89, -51.6369) ccw
  line L201 (13.3401, -51.6369) -> (13.3401, -51.6367)
  line L202 (13.3401, -51.6367) -> (13.3401, -51.6369)
  line L203 (14.4399, -51.6367) -> (14.4399, -51.6369)
  line L204 (14.4399, -51.6369) -> (14.4399, -51.6367)
  arc A136 (16.9799, -51.6367) -> (15.8801, -51.6367) centre (16.43, -51.6367) ccw
  arc A137 (15.8801, -51.6369) -> (16.9799, -51.6369) centre (16.43, -51.6369) ccw
  line L205 (15.8801, -51.6367) -> (15.8801, -51.6369)
  line L206 (15.8801, -51.6369) -> (15.8801, -51.6367)
  line L207 (16.9799, -51.6367) -> (16.9799, -51.6369)
  line L208 (16.9799, -51.6369) -> (16.9799, -51.6367)
  circle A138 centre (58.8011, -4.5499) radius 0.4572
  circle A139 centre (61.3411, -4.5491) radius 0.4572
  circle A140 centre (61.3411, -4.5491) radius 0.762
  circle A141 centre (63.8811, -4.5491) radius 0.4572
  circle A142 centre (63.8811, -4.5491) radius 0.762
  circle A143 centre (66.4211, -4.5491) radius 0.4572
  circle A144 centre (66.4211, -4.5491) radius 0.762
  circle A145 centre (32.5001, -5.7501) radius 0.6
  circle A146 centre (32.5001, -5.7501) radius 0.9
  circle A147 centre (37.5001, -5.7501) radius 0.6
  circle A148 centre (37.5001, -5.7501) radius 0.9
  circle A149 centre (32.5001, -20.2499) radius 0.6
  circle A150 centre (32.5001, -20.2499) radius 0.9
  circle A151 centre (35, -20.2499) radius 0.6
  circle A152 centre (35, -20.2499) radius 0.9
  circle A153 centre (37.5001, -20.2499) radius 0.6
  circle A154 centre (37.5001, -20.2499) radius 0.9
  arc A155 (28.6, -12.0501) -> (30, -12.0501) centre (29.3, -12.0501) ccw
  arc A156 (30, -13.4501) -> (28.6, -13.4501) centre (29.3, -13.4501) ccw
  line L209 (28.6, -13.4501) -> (28.6, -12.0501)
  line L210 (28.6, -12.0501) -> (28.6, -13.4501)
  line L211 (30, -13.4501) -> (30, -12.0501)
  line L212 (30, -12.0501) -> (30, -13.4501)
  arc A157 (40, -12.0501) -> (41.4, -12.0501) centre (40.7, -12.0501) ccw
  arc A158 (41.4, -13.4501) -> (40, -13.4501) centre (40.7, -13.4501) ccw
  line L213 (40, -12.0501) -> (40, -13.4501)
  line L214 (40, -13.4501) -> (40, -12.0501)
  line L215 (41.4, -12.0501) -> (41.4, -13.4501)
  line L216 (41.4, -13.4501) -> (41.4, -12.0501)
  circle A159 centre (87.5001, -5.7501) radius 0.6
  circle A160 centre (87.5001, -5.7501) radius 0.9
  circle A161 centre (92.5001, -5.7501) radius 0.6
  circle A162 centre (92.5001, -5.7501) radius 0.9
  circle A163 centre (87.5001, -20.2499) radius 0.6
  circle A164 centre (87.5001, -20.2499) radius 0.9
  circle A165 centre (90, -20.2499) radius 0.6
  circle A166 centre (90, -20.2499) radius 0.9
  circle A167 centre (92.5001, -20.2499) radius 0.6
  circle A168 centre (92.5001, -20.2499) radius 0.9
  arc A169 (83.6, -12.0501) -> (85, -12.0501) centre (84.3, -12.0501) ccw
  arc A170 (85, -13.4501) -> (83.6, -13.4501) centre (84.3, -13.4501) ccw
  line L217 (83.6, -12.0501) -> (83.6, -13.4501)
  line L218 (83.6, -13.4501) -> (83.6, -12.0501)
  line L219 (85, -13.4501) -> (85, -12.0501)
  line L220 (85, -12.0501) -> (85, -13.4501)
  arc A171 (95, -12.0501) -> (96.4, -12.0501) centre (95.7, -12.0501) ccw
  arc A172 (96.4, -13.4501) -> (95, -13.4501) centre (95.7, -13.4501) ccw
  line L221 (95, -13.4501) -> (95, -12.0501)
  line L222 (95, -12.0501) -> (95, -13.4501)
  line L223 (96.4, -12.0501) -> (96.4, -13.4501)
  line L224 (96.4, -13.4501) -> (96.4, -12.0501)
  circle A173 centre (11.2355, -28.4567) radius 0.2
  circle A174 centre (8.2985, -33.2898) radius 0.2
  circle A175 centre (12.0828, -85.3744) radius 0.2
  circle A176 centre (90, -16.6876) radius 0.2
  circle A177 centre (43.7206, -68.8435) radius 0.2
  circle A178 centre (6.6589, -46.5507) radius 0.2
  circle A179 centre (65.2781, -49.0729) radius 0.2
  circle A180 centre (7.7234, -36.6269) radius 0.2
  circle A181 centre (37.9731, -42.0879) radius 1.9939
  circle A182 centre (62.1031, -42.0879) radius 1.9939
  circle A183 centre (86.2332, -42.0879) radius 1.9939
  circle A184 centre (14.097, -65.3924) radius 1.9939
  circle A185 centre (37.9731, -65.3924) radius 1.9939
  circle A186 centre (62.1031, -65.3924) radius 1.9939
  circle A187 centre (86.2332, -65.3924) radius 1.9939
  circle A188 centre (14.097, -88.697) radius 1.9939
  circle A189 centre (37.9731, -88.697) radius 1.9939
  circle A190 centre (62.1031, -88.697) radius 1.9939
  circle A191 centre (86.2332, -88.697) radius 1.9939
  circle A192 centre (52.1971, -28.1179) radius 1.016
  circle A193 centre (72.8981, -28.1179) radius 1.016
  circle A194 centre (52.1971, -4.9174) radius 1.016
  circle A195 centre (72.8981, -4.9174) radius 1.016
  line L225 (-2, -102) -> (-2, 2)
  line L226 (-2, 2) -> (102, 2)
  line L227 (102, 2) -> (102, -102)
  line L228 (102, -102) -> (-2, -102)
  line L229 (24.8899, -1.7367) -> (2.8899, -1.7367)
  line L230 (2.8899, -1.7367) -> (2.8899, -53.7367)
  line L231 (2.8899, -53.7367) -> (24.8899, -53.7367)
  line L232 (24.8899, -53.7367) -> (24.8899, -1.7367)
  line L233 (20.947, -96.197) -> (7.247, -96.197)
  line L234 (7.247, -96.197) -> (7.247, -81.197)
  line L235 (7.247, -81.197) -> (20.947, -81.197)
  line L236 (20.947, -81.197) -> (20.947, -96.197)
  line L237 (20.947, -96.197) -> (7.247, -81.197) construction
  line L238 (7.247, -96.197) -> (20.947, -81.197) construction
  line L239 (44.8231, -96.197) -> (31.1231, -96.197)
  line L240 (31.1231, -96.197) -> (31.1231, -81.197)
  line L241 (31.1231, -81.197) -> (44.8231, -81.197)
  line L242 (44.8231, -81.197) -> (44.8231, -96.197)
  line L243 (44.8231, -96.197) -> (31.1231, -81.197) construction
  line L244 (31.1231, -96.197) -> (44.8231, -81.197) construction
  line L245 (20.947, -72.8924) -> (7.247, -72.8924)
  line L246 (7.247, -72.8924) -> (7.247, -57.8924)
  line L247 (7.247, -57.8924) -> (20.947, -57.8924)
  line L248 (20.947, -57.8924) -> (20.947, -72.8924)
  line L249 (20.947, -72.8924) -> (7.247, -57.8924) construction
  line L250 (7.247, -72.8924) -> (20.947, -57.8924) construction
  line L251 (44.8231, -72.8924) -> (31.1231, -72.8924)
  line L252 (31.1231, -72.8924) -> (31.1231, -57.8924)
  line L253 (31.1231, -57.8924) -> (44.8231, -57.8924)
  line L254 (44.8231, -57.8924) -> (44.8231, -72.8924)
  line L255 (44.8231, -72.8924) -> (31.1231, -57.8924) construction
  line L256 (31.1231, -72.8924) -> (44.8231, -57.8924) construction
  line L257 (44.8231, -49.5879) -> (31.1231, -49.5879)
  line L258 (31.1231, -49.5879) -> (31.1231, -34.5879)
  line L259 (31.1231, -34.5879) -> (44.8231, -34.5879)
  line L260 (44.8231, -34.5879) -> (44.8231, -49.5879)
  line L261 (44.8231, -49.5879) -> (31.1231, -34.5879) construction
  line L262 (31.1231, -49.5879) -> (44.8231, -34.5879) construction
  line L263 (68.9531, -96.197) -> (55.2531, -96.197)
  line L264 (55.2531, -96.197) -> (55.2531, -81.197)
  line L265 (55.2531, -81.197) -> (68.9531, -81.197)
  line L266 (68.9531, -81.197) -> (68.9531, -96.197)
  line L267 (68.9531, -96.197) -> (55.2531, -81.197) construction
  line L268 (55.2531, -96.197) -> (68.9531, -81.197) construction
  line L269 (93.0832, -96.197) -> (79.3832, -96.197)
  line L270 (79.3832, -96.197) -> (79.3832, -81.197)
  line L271 (79.3832, -81.197) -> (93.0832, -81.197)
  line L272 (93.0832, -81.197) -> (93.0832, -96.197)
  line L273 (93.0832, -96.197) -> (79.3832, -81.197) construction
  line L274 (79.3832, -96.197) -> (93.0832, -81.197) construction
  line L275 (68.9531, -72.8924) -> (55.2531, -72.8924)
  line L276 (55.2531, -72.8924) -> (55.2531, -57.8924)
  line L277 (55.2531, -57.8924) -> (68.9531, -57.8924)
  line L278 (68.9531, -57.8924) -> (68.9531, -72.8924)
  line L279 (68.9531, -72.8924) -> (55.2531, -57.8924) construction
  line L280 (55.2531, -72.8924) -> (68.9531, -57.8924) construction
  line L281 (93.0832, -72.8924) -> (79.3832, -72.8924)
  line L282 (79.3832, -72.8924) -> (79.3832, -57.8924)
  line L283 (79.3832, -57.8924) -> (93.0832, -57.8924)
  line L284 (93.0832, -57.8924) -> (93.0832, -72.8924)
  line L285 (93.0832, -72.8924) -> (79.3832, -57.8924) construction
  line L286 (79.3832, -72.8924) -> (93.0832, -57.8924) construction
  line L287 (68.9531, -49.5879) -> (55.2531, -49.5879)
  line L288 (55.2531, -49.5879) -> (55.2531, -34.5879)
  line L289 (55.2531, -34.5879) -> (68.9531, -34.5879)
  line L290 (68.9531, -34.5879) -> (68.9531, -49.5879)
  line L291 (68.9531, -49.5879) -> (55.2531, -34.5879) construction
  line L292 (55.2531, -49.5879) -> (68.9531, -34.5879) construction
  line L293 (93.0832, -49.5879) -> (79.3832, -49.5879)
  line L294 (79.3832, -49.5879) -> (79.3832, -34.5879)
  line L295 (79.3832, -34.5879) -> (93.0832, -34.5879)
  line L296 (93.0832, -34.5879) -> (93.0832, -49.5879)
  line L297 (93.0832, -49.5879) -> (79.3832, -34.5879) construction
  line L298 (79.3832, -49.5879) -> (93.0832, -34.5879) construction
  line L299 (50.8951, -28.1499) -> (74.2113, -4.8412)
  line L300 (74.2113, -4.8412) -> (74.1961, -28.1534)
  line L301 (74.1961, -28.1534) -> (50.8915, -4.8514)
  line L302 (76.1953, -30.1524) -> (48.9111, -30.1524)
  line L303 (48.9111, -30.1524) -> (48.9111, -2.8387)
  line L304 (48.9111, -2.8387) -> (76.1953, -2.8387)
  line L305 (76.1953, -2.8387) -> (76.1953, -30.1524)
  line L306 (76.1953, -30.1524) -> (48.9111, -2.8387) construction
  line L307 (48.9111, -30.1524) -> (76.1953, -2.8387) construction
  line L308 (96.75, -21.2501) -> (83.25, -21.2501)
  line L309 (83.25, -21.2501) -> (83.25, -4.2501)
  line L310 (83.25, -4.2501) -> (96.75, -4.2501)
  line L311 (96.75, -4.2501) -> (96.75, -21.2501)
  line L312 (96.75, -21.2501) -> (83.25, -4.2501) construction
  line L313 (83.25, -21.2501) -> (96.75, -4.2501) construction
  line L314 (41.85, -21.2501) -> (28.15, -21.2501)
  line L315 (28.15, -21.2501) -> (28.15, -4.2501)
  line L316 (28.15, -4.2501) -> (41.85, -4.2501)
  line L317 (41.85, -4.2501) -> (41.85, -21.2501)
  line L318 (41.85, -21.2501) -> (28.15, -4.2501) construction
  line L319 (28.15, -21.2501) -> (41.85, -4.2501) construction
  line L320 (108, 5) -> (108, -105)
  line L321 (105, -108) -> (-5, -108)
  line L322 (-8, -105) -> (-8, 5)
  line L323 (-5, 8) -> (105, 8)
  line L324 (102, 2) -> (108, 8)
  line L325 (-8, 8) -> (-2, 2)
  line L326 (-8, -108) -> (-2, -102)
  line L327 (102, -102) -> (108, -108)
  circle A196 centre (105, -105) radius 1.1
  circle A197 centre (105, 5) radius 1.1
  circle A198 centre (-5, 5) radius 1.1
  circle A199 centre (-5, -105) radius 1.1
  arc A200 (-5, 8) -> (-8, 5) centre (-5, 5) ccw
  arc A201 (108, 5) -> (105, 8) centre (105, 5) ccw
  arc A202 (105, -108) -> (108, -105) centre (105, -105) ccw
  arc A203 (-8, -105) -> (-5, -108) centre (-5, -105) ccw
  point P0 (14.097, -88.697)
  point P1 (37.9731, -88.697)
  point P2 (14.097, -65.3924)
  point P3 (37.9731, -65.3924)
  point P4 (37.9731, -42.0879)
  point P5 (62.1031, -88.697)
  point P6 (86.2332, -88.697)
  point P7 (62.1031, -65.3924)
  point P8 (86.2332, -65.3924)
  point P9 (62.1031, -42.0879)
  point P10 (86.2332, -42.0879)
  point P11 (62.5532, -16.4956)
  point P12 (90, -12.7501)
  point P13 (35, -12.7501)
  dimension "d3" = 13.7
  dimension "d4" = 15
  dimension "d5" = 13.7
  dimension "d6" = 15
  dimension "d7" = 13.7
  dimension "d8" = 15
  dimension "d9" = 13.7
  dimension "d10" = 15
  dimension "d11" = 13.7
  dimension "d12" = 15
  dimension "d13" = 13.7
  dimension "d14" = 15
  dimension "d15" = 13.7
  dimension "d16" = 15
  dimension "d17" = 13.7
  dimension "d18" = 15
  dimension "d19" = 13.7
  dimension "d20" = 15
  dimension "d21" = 13.7
  dimension "d22" = 15
  dimension "d23" = 13.7
  dimension "d24" = 15
  dimension "d25" = 13.5
  dimension "d26" = 17
  dimension "d27" = 13.7
  dimension "d28" = 17
  dimension "d30" = 2.2
  dimension "d31" = 2.2
  dimension "d32" = 2.2
  dimension "d33" = 2.2
  dimension "d46" = 3
  dimension "d47" = 3
  dimension "d48" = 3
  dimension "d49" = 3
extrude "Extrude1" add sketch "MacroKeyboard" against normal blind 2 contours L225 L226 L227 L228
extrude "Extrude2" add sketch "MacroKeyboard" against normal blind 33 contours L225 L322 L325 L326 A198 A199 A200 A203 | L228 L321 L326 L327 A196 A199 A202 A203 | L226 L323 L324 L325 A197 A198 A200 A201 | L227 L320 L324 L327 A196 A197 A201 A202 | L326 A199 | L326 A199 | L325 A198 | L325 A198 | L327 A196 | L327 A196 | L324 A197 | L324 A197
extrude "Extrude3" cut sketch "MacroKeyboard" against normal blind 40 from surface at -20 contours L326 A199 | L326 A199 | L325 A198 | L325 A198 | L327 A196 | L327 A196 | L324 A197 | L324 A197
sketch "Sketch2" plane through (-8, 0, 0) normal (-1, 0, 0) x (0, -1, 0)
  line L0 (0, 105) -> (0, -5)
  line L1 (33, -5) -> (33, 105)
  circle A0 centre (18, 12) radius 8.5
  line L2 (0, -5) -> (33, -5)
  line L3 (33, 105) -> (0, 105)
  dimension "d41" = 17
  dimension "d43" = 18
extrude "Extrude4" cut sketch "Sketch2" against normal blind 13 contours A0
